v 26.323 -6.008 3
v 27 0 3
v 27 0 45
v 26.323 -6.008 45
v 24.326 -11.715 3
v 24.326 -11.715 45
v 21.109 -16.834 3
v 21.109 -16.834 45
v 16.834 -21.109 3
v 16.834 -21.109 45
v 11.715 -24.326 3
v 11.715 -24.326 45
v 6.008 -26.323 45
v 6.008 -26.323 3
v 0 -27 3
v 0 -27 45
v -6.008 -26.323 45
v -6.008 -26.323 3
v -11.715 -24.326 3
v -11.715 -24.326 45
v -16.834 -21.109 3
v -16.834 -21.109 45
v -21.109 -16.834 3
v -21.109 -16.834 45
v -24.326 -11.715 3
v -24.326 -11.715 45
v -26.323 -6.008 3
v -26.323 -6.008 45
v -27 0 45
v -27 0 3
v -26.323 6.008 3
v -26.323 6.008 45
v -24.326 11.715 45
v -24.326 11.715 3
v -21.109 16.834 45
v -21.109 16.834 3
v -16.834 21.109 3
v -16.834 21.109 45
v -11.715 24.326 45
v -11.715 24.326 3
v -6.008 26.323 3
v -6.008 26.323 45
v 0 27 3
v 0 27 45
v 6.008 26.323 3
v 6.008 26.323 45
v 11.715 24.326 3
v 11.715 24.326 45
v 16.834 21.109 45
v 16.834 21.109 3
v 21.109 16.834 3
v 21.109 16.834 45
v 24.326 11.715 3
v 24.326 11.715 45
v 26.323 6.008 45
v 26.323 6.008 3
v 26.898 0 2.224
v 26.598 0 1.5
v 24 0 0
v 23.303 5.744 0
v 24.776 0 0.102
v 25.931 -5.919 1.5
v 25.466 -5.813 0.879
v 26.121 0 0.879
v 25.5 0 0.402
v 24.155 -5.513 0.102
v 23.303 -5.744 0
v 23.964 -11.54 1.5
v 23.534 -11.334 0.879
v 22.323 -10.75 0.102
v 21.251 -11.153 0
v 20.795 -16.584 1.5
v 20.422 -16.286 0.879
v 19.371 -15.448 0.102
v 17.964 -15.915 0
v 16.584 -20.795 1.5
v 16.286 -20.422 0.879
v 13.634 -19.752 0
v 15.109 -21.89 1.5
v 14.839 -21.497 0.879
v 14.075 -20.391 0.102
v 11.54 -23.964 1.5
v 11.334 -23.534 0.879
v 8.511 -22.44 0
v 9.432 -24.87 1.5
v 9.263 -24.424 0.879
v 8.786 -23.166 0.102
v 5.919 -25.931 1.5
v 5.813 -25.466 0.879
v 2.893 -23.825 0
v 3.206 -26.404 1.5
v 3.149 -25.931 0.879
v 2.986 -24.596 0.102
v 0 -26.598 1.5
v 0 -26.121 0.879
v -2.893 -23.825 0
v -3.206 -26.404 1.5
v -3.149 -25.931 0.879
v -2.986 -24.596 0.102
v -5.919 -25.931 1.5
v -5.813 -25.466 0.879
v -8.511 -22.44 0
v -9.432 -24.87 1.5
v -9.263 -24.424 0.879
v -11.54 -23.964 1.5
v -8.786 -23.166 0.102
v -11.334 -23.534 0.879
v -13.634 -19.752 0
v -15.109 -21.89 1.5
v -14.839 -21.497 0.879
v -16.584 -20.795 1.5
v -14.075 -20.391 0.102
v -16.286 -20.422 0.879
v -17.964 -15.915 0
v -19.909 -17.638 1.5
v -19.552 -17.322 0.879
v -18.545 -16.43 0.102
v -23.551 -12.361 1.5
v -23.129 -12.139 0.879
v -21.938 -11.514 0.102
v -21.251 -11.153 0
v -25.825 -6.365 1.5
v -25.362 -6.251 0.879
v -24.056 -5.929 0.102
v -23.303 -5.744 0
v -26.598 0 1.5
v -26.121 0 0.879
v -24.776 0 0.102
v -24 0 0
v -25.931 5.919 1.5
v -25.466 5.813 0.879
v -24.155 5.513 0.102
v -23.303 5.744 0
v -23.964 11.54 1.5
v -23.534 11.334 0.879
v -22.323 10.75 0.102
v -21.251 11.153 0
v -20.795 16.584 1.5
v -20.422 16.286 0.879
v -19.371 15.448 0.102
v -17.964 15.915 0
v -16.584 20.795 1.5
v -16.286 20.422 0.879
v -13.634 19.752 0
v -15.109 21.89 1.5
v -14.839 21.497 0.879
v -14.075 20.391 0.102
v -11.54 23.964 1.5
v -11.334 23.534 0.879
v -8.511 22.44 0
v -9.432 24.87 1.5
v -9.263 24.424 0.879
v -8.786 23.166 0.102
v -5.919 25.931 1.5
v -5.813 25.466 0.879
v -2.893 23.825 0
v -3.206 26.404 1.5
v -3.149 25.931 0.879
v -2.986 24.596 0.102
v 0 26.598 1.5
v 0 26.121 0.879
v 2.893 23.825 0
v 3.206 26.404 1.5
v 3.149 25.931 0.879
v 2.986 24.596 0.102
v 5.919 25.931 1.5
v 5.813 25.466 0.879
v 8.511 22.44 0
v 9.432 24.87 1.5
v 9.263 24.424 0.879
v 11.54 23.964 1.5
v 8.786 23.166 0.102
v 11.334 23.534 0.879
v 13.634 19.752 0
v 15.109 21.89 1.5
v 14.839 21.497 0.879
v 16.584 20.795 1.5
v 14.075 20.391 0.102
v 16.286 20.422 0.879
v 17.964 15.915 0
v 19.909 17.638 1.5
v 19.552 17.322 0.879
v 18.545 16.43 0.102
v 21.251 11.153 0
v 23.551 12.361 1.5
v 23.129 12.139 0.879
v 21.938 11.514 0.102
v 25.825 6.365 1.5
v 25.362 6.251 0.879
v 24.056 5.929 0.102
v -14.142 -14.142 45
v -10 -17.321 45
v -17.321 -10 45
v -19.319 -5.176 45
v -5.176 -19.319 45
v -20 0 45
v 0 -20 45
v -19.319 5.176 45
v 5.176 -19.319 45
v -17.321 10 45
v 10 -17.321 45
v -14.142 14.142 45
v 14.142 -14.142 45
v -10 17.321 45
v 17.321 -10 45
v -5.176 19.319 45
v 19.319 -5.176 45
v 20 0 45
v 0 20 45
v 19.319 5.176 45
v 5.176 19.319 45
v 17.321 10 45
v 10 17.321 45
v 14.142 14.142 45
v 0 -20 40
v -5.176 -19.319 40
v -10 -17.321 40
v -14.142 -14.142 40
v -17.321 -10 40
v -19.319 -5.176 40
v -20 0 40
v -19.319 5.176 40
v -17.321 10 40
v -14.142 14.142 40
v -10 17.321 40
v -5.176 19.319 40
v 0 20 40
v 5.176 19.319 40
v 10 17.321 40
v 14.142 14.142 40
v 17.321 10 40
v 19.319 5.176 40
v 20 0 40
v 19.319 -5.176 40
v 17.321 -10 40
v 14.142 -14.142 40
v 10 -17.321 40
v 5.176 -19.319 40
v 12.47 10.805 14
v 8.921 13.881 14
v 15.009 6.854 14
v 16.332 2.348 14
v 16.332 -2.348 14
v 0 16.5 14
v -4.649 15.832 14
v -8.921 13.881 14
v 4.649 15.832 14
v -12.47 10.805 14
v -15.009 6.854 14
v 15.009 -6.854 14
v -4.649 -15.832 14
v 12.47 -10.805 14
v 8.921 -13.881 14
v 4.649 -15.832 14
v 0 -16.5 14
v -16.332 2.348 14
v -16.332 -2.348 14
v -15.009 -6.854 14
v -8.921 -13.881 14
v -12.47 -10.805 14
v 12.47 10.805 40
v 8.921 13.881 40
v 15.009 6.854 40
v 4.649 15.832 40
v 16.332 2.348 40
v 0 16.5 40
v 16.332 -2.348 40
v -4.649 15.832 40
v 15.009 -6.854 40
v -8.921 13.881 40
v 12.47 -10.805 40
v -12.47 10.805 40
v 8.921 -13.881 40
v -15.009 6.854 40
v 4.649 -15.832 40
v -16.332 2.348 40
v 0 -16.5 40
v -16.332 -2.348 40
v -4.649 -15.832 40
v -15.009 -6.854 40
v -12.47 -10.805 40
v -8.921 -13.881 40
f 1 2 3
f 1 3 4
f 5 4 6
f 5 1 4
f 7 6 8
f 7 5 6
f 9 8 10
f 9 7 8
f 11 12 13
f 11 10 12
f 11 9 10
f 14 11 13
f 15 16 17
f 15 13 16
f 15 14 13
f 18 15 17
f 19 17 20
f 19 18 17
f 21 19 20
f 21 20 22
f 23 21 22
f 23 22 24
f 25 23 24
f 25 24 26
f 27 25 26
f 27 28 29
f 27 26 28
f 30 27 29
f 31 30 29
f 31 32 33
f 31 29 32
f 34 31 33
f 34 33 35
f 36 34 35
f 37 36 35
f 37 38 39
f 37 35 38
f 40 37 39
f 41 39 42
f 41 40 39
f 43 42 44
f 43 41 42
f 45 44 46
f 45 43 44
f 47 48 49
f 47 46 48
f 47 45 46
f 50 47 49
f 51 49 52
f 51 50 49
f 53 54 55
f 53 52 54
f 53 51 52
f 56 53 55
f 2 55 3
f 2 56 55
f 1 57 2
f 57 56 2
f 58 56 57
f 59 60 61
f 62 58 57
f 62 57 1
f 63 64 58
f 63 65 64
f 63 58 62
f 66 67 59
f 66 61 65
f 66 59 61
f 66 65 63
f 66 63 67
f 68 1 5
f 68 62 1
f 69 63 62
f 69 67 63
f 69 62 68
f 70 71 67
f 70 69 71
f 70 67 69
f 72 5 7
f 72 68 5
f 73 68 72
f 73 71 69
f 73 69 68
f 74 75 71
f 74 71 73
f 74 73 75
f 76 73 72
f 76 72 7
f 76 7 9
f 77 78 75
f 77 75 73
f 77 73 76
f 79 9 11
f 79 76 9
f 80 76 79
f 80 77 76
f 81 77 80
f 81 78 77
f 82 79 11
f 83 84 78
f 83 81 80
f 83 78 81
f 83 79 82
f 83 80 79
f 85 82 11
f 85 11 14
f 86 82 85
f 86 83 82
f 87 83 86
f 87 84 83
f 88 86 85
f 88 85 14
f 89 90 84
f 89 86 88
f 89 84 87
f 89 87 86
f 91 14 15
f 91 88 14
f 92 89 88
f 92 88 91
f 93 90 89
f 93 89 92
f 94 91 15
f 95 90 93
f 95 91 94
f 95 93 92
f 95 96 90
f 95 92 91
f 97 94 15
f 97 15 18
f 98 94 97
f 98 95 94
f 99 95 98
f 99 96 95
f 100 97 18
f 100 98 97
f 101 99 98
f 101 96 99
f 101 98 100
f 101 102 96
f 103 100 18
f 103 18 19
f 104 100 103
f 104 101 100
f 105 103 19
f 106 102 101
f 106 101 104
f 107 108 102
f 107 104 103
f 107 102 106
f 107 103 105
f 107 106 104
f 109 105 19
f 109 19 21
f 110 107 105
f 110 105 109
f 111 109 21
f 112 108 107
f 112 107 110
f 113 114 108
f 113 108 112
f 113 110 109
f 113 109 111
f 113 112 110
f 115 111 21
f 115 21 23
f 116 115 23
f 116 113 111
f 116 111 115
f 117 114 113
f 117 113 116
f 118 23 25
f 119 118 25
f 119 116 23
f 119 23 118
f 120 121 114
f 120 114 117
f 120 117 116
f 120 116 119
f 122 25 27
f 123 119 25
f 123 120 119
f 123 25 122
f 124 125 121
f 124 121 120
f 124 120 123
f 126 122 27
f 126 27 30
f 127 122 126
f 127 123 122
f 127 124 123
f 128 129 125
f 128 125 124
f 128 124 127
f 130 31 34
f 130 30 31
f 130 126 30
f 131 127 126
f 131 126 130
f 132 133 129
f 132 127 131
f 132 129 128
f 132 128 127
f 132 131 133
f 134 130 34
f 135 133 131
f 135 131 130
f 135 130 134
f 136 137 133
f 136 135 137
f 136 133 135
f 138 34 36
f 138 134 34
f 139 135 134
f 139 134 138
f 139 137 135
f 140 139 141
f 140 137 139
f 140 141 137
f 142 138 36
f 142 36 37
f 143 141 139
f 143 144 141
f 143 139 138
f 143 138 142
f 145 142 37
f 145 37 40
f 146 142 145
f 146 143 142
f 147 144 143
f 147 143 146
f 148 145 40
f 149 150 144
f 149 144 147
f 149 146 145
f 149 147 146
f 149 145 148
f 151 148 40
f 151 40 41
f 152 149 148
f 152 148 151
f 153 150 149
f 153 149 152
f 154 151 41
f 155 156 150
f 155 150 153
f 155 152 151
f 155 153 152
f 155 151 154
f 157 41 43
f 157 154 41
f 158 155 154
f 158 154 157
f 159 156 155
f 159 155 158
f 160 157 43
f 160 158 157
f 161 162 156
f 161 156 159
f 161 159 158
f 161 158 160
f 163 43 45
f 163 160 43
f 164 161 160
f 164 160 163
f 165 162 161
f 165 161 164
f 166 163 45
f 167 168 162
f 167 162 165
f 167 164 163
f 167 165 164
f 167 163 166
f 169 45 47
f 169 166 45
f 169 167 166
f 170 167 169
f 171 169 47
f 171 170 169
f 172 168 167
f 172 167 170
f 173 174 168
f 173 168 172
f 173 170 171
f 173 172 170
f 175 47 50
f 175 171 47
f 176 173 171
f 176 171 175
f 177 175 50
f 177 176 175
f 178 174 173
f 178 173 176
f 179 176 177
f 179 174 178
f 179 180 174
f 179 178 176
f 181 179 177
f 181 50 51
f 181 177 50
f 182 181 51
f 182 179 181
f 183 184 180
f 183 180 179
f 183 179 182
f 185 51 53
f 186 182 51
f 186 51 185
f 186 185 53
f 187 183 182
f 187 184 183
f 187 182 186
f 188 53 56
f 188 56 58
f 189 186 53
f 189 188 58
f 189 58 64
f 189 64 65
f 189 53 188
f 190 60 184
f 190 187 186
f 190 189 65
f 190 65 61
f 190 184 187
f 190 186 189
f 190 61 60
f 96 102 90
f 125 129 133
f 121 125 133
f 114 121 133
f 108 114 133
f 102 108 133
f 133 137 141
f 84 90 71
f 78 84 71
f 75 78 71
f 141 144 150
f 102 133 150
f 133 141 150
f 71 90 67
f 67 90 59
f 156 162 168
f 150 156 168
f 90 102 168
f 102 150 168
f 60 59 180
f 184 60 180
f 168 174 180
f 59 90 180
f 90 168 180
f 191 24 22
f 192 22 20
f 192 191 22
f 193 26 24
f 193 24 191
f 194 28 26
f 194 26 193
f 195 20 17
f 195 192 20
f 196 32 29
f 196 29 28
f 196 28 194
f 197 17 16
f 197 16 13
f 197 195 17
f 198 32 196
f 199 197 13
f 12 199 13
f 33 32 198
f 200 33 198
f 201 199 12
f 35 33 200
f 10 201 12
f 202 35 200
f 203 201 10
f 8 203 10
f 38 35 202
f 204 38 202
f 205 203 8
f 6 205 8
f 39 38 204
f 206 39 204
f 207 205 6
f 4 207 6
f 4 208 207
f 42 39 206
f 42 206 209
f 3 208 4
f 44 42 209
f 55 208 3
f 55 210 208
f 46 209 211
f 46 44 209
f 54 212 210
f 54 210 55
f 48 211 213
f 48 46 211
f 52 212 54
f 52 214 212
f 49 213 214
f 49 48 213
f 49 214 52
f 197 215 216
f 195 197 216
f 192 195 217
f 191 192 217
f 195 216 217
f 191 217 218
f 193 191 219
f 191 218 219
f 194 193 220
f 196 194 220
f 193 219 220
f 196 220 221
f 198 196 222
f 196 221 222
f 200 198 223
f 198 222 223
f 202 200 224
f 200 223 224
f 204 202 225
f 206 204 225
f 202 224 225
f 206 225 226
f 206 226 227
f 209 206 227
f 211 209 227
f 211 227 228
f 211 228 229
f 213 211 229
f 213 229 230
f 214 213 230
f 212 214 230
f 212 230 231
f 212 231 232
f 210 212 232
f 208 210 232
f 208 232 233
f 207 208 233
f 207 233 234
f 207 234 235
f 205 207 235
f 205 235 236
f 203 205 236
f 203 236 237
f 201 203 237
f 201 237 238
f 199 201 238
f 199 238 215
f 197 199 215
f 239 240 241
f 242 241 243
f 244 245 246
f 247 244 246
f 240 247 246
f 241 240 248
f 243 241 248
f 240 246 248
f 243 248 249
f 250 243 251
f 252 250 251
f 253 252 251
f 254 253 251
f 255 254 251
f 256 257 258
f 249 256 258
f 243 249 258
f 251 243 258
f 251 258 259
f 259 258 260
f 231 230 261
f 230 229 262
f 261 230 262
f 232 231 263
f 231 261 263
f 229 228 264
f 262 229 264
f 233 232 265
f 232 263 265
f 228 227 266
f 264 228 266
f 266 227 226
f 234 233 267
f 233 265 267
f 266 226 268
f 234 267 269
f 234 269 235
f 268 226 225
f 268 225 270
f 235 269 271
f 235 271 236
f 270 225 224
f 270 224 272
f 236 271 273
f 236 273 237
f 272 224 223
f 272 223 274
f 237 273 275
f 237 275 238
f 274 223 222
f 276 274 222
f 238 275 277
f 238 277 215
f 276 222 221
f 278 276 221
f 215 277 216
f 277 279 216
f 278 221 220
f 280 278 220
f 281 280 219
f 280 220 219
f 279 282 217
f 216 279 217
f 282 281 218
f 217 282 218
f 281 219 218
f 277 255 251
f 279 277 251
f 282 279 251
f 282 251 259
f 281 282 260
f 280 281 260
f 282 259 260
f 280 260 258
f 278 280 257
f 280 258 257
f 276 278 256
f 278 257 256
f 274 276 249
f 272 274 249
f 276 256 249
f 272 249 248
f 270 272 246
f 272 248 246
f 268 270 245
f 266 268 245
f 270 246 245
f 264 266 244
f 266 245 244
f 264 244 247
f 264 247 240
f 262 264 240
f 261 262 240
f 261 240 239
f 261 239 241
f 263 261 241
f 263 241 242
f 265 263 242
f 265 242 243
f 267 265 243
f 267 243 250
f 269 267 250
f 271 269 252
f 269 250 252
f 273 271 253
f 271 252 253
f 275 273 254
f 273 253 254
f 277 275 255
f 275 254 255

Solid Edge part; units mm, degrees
sketch "Sketch1" plane through (0, 0, 0) normal (0, 0, 1) x (1, 0, 0)
  circle A0 centre (0, 0) radius 27
extrude "Protrusion1" add sketch "Sketch1" along normal blind 45
hole "Agujero_1" at (0, 0, 45) direction (0, 0, -1) diameter 40 depth 5
hole "Agujero_3" at (0, 0, 40) direction (0, 0, -1) diameter 33 depth 26
fillet "Redondeo_1" radius 3 1 edges at (-27, 0, 0)
